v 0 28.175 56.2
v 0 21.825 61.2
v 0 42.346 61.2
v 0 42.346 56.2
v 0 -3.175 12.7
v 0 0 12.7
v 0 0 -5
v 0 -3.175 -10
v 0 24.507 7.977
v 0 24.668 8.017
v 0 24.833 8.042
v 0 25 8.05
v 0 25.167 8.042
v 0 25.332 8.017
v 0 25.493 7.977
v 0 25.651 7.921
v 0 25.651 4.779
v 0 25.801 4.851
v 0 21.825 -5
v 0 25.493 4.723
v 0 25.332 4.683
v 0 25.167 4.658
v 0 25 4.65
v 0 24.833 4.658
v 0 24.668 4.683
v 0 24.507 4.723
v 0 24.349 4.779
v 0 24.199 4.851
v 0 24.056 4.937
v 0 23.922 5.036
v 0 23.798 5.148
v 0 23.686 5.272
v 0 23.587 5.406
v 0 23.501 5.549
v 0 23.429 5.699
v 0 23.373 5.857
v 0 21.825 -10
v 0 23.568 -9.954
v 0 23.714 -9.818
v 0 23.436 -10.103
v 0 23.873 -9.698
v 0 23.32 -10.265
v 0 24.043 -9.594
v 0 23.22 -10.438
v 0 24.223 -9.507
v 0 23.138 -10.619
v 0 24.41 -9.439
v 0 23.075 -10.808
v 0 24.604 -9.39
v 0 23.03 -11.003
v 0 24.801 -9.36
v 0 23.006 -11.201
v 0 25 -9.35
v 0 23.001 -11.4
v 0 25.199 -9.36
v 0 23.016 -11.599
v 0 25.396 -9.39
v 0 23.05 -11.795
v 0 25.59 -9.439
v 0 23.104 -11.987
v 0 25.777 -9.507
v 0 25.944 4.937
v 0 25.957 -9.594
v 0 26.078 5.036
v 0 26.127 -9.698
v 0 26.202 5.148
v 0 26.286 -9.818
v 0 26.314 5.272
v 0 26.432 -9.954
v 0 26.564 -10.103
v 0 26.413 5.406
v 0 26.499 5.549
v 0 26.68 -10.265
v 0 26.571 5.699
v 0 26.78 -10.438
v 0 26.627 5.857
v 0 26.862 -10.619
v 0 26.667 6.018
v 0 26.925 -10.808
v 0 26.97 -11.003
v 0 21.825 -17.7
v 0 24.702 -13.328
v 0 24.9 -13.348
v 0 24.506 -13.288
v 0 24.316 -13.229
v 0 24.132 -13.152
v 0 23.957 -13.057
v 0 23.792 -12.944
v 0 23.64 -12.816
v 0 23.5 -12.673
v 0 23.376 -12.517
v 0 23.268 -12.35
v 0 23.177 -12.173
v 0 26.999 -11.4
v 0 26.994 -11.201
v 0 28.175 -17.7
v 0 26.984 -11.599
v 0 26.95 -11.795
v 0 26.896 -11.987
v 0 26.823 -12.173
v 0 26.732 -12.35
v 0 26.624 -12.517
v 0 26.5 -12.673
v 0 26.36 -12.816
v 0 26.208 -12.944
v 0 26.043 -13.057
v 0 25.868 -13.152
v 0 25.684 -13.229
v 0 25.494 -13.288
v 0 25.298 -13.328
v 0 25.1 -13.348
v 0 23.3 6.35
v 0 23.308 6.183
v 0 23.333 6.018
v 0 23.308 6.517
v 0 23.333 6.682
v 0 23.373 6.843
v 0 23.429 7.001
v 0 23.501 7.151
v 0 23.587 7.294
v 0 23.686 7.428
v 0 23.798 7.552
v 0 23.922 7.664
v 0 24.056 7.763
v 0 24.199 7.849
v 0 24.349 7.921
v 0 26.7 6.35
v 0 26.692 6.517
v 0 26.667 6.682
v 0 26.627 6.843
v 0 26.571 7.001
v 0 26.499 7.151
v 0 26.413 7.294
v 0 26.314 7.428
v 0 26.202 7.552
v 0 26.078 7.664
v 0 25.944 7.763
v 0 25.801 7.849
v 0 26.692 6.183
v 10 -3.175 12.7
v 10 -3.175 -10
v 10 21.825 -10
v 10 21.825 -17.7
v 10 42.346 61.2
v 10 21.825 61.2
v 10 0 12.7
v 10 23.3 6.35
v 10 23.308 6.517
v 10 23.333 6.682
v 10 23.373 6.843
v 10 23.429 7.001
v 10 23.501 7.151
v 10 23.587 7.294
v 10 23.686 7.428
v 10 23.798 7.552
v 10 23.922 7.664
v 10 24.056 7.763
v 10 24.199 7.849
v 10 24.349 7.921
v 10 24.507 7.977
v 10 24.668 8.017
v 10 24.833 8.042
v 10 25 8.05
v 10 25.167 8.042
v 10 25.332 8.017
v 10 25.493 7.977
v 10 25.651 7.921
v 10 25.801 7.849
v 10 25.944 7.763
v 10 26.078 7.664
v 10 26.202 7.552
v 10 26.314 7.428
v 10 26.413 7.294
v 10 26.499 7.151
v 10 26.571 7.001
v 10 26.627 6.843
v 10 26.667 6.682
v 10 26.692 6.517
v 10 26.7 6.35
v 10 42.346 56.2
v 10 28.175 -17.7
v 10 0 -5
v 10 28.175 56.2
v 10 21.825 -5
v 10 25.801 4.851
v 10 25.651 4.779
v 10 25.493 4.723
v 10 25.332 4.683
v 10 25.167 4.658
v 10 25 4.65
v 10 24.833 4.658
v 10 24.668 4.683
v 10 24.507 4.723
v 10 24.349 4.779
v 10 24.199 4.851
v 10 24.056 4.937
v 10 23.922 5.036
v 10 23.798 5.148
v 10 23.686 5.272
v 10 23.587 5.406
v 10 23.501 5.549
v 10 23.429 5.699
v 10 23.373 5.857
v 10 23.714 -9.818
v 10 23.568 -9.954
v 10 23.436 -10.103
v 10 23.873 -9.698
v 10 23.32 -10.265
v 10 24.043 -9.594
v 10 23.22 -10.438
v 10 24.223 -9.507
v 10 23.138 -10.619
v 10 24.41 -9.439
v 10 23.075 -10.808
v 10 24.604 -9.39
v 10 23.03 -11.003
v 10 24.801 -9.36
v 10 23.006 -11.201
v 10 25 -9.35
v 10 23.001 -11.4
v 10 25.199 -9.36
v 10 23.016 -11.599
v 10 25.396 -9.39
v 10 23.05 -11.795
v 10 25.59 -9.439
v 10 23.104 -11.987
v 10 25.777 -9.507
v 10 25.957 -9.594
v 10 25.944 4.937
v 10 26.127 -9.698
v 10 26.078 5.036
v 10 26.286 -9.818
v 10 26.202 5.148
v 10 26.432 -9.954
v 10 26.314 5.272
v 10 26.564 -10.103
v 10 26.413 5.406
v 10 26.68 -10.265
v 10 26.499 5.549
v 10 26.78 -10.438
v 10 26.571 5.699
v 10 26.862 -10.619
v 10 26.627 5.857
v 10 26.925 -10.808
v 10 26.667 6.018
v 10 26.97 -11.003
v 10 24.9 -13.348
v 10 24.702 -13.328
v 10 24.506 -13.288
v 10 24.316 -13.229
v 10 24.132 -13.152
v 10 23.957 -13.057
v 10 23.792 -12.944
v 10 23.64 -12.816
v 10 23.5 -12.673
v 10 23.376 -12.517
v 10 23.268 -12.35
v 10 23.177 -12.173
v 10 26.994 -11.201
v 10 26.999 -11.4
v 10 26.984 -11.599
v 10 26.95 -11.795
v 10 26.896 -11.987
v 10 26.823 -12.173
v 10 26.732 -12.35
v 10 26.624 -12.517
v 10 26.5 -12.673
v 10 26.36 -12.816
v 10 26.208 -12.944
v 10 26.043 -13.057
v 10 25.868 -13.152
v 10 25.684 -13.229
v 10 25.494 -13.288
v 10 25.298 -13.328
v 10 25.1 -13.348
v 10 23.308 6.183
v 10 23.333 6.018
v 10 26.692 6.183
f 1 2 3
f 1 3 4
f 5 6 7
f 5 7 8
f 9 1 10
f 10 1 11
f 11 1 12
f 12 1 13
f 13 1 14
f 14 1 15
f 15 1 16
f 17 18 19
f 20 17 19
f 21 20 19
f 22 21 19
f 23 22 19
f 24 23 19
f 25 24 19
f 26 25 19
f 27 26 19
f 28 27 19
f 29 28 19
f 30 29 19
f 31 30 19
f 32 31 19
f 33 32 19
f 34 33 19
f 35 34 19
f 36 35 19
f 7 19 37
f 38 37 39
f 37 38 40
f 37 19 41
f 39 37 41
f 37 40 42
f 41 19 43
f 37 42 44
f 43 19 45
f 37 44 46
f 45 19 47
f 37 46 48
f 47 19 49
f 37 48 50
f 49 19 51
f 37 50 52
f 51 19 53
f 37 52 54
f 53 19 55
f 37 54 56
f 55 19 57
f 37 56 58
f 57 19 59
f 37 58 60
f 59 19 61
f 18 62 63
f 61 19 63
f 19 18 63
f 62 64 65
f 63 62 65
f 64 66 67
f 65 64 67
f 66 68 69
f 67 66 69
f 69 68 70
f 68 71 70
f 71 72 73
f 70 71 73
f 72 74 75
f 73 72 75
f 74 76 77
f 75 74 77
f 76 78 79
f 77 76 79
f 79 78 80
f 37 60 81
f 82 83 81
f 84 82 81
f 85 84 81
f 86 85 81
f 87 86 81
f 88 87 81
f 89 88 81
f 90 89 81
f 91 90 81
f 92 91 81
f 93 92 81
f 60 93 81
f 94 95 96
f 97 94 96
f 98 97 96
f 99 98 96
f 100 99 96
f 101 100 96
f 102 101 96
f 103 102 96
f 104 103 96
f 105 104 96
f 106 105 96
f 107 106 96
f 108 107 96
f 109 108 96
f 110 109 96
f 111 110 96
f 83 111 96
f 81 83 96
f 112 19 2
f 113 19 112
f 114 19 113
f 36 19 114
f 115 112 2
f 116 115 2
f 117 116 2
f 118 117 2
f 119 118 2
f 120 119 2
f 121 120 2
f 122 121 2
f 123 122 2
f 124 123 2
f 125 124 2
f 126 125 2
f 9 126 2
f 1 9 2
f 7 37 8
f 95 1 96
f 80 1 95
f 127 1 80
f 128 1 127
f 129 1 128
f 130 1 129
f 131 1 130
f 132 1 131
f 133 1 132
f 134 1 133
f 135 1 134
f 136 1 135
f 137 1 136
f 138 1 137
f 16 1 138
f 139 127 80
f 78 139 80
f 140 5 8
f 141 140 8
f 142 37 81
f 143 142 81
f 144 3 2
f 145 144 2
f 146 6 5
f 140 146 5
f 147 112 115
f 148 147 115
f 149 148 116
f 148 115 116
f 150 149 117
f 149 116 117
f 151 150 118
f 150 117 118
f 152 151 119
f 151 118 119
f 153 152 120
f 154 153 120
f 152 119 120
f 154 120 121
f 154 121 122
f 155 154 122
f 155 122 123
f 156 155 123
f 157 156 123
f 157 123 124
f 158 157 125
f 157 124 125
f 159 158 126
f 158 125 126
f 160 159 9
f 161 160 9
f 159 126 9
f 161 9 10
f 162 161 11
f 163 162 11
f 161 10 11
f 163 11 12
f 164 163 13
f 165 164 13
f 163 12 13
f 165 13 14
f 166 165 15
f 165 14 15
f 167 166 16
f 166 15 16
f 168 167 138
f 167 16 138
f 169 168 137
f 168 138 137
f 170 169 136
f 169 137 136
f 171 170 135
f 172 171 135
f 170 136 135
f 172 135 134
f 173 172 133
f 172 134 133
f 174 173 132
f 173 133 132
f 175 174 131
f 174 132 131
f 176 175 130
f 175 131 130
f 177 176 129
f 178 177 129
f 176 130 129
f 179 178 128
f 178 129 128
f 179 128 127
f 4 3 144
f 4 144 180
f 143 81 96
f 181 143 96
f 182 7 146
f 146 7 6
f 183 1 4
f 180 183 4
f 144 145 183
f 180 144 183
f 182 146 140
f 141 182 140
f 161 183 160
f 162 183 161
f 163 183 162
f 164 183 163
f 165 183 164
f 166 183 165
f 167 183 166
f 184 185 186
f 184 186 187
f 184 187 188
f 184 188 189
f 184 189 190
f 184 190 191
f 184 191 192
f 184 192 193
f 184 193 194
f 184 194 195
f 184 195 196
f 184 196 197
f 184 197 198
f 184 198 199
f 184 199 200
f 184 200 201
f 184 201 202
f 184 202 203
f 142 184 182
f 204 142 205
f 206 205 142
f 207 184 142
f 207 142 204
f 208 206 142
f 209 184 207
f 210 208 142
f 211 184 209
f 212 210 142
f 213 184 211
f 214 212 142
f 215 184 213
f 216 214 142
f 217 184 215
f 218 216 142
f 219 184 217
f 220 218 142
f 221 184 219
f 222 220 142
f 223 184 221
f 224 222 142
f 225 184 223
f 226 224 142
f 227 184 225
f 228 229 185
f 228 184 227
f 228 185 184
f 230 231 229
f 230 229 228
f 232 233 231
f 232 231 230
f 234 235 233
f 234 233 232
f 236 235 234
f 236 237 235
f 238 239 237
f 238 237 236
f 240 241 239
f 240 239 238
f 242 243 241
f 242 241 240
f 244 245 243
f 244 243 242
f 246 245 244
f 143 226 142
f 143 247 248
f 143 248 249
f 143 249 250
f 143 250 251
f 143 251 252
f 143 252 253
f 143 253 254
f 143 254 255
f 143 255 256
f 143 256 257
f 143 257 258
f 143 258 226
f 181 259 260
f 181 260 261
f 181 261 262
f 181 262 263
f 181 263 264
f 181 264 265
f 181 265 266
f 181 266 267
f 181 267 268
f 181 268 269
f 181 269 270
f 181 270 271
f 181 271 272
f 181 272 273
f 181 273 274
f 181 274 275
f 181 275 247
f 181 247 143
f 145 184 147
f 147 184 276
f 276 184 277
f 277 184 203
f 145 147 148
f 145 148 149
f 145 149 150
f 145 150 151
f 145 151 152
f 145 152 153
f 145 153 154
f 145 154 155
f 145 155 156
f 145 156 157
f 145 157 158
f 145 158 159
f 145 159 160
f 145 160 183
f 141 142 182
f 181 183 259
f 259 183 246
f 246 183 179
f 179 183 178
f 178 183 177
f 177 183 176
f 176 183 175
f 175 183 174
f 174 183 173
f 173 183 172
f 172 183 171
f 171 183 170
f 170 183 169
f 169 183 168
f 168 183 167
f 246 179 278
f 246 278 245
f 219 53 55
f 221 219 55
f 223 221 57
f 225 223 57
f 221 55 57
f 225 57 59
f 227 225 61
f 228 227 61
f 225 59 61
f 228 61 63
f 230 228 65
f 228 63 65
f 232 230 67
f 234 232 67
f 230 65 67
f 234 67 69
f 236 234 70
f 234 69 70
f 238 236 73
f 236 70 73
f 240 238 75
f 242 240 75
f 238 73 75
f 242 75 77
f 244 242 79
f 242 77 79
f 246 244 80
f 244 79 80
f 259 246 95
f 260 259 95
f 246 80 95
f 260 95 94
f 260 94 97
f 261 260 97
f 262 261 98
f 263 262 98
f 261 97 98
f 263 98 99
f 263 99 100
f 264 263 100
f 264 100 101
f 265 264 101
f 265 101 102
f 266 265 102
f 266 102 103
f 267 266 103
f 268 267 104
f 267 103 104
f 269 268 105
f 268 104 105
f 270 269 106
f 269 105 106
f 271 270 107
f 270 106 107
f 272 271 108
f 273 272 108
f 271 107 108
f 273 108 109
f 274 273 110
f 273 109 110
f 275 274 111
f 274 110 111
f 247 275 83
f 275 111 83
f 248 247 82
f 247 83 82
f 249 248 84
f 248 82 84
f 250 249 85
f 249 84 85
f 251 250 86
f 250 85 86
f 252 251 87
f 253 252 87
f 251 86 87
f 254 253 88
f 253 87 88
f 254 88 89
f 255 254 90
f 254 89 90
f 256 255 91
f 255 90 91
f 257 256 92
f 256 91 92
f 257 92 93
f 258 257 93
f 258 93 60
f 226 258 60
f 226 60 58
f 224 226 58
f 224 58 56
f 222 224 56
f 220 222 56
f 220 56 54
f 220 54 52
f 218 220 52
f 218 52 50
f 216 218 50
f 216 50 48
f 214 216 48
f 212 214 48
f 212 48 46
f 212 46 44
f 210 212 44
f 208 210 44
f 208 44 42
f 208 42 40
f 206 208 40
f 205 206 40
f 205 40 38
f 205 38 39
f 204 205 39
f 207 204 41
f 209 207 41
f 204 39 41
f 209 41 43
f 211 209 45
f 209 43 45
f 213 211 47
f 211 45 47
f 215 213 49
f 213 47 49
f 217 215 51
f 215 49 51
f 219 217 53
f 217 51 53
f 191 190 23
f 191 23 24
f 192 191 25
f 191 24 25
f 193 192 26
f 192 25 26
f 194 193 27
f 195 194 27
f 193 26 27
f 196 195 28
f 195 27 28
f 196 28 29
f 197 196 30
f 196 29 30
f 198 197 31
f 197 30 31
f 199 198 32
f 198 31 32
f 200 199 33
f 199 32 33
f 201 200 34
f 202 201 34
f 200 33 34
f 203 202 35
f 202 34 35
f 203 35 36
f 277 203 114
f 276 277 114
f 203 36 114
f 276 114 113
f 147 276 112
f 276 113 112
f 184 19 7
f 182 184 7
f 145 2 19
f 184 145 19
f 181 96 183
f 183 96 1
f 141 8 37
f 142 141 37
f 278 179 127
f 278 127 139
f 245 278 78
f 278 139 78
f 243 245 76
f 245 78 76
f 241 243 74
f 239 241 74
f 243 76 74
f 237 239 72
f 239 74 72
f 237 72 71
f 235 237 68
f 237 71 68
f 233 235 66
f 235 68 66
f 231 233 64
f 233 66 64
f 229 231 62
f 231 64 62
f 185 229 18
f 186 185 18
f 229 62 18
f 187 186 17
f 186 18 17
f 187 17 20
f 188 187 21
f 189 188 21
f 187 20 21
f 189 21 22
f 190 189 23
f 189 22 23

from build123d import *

# Parameters (mm, degrees)
SKETCH1_W           = 5
SKETCH1_H           = 14.17103806
BOSS_EXTRUDE1_DEPTH = 10


with BuildPart() as part:
    # Sketch1 → Boss-Extrude1 (new body)
    with BuildSketch(Plane(origin=(0, 0, 0), x_dir=(0, 0, -1), z_dir=(1, 0, 0))):
        with BuildLine():
            Line((-61.2, 21.825), (-6.35, 21.825))
            Line((-6.35, 21.825), (-6.35, 23.3))
            ThreePointArc((-6.35, 23.3), (-8.05, 25), (-6.35, 26.7))
            Line((-6.35, 26.7), (-6.35, 28.175))
            Line((-6.35, 28.175), (-56.2, 28.175))
            Line((-56.2, 28.175), (-61.2, 28.175))
            Line((-61.2, 28.175), (-61.2, 21.825))
        make_face()
        with BuildLine():
            Line((-6.35, 21.825), (0, 21.825))
            Line((0, 21.825), (5, 21.825))
            Line((5, 21.825), (10, 21.825))
            Line((10, 21.825), (17.7, 21.825))
            Line((17.7, 21.825), (17.7, 25))
            Line((17.7, 25), (13.35, 25))
            ThreePointArc((13.35, 25), (11.35, 23), (9.35, 25))
            Line((9.35, 25), (-4.65, 25))
            ThreePointArc((-4.65, 25), (-5.147918472, 23.797918472), (-6.35, 23.3))
            Line((-6.35, 23.3), (-6.35, 21.825))
        make_face()
        with BuildLine():
            Line((-6.35, 28.175), (-6.35, 26.7))
            ThreePointArc((-6.35, 26.7), (-5.147918472, 26.202081528), (-4.65, 25))
            Line((-4.65, 25), (9.35, 25))
            ThreePointArc((9.35, 25), (11.35, 27), (13.35, 25))
            Line((13.35, 25), (17.7, 25))
            Line((17.7, 25), (17.7, 28.175))
            Line((17.7, 28.175), (-6.35, 28.175))
        make_face()
        Polygon((5, 21.825), (5, 0), (5, -3.175), (10, -3.175), (10, 21.825), align=None)
        Polygon((5, 0), (0, 0), (-12.7, 0), (-12.7, -3.175), (5, -3.175), align=None)
        with Locations((-58.7, 35.26051903)):
            Rectangle(SKETCH1_W, SKETCH1_H)
    extrude(amount=BOSS_EXTRUDE1_DEPTH)


solid = part.part
